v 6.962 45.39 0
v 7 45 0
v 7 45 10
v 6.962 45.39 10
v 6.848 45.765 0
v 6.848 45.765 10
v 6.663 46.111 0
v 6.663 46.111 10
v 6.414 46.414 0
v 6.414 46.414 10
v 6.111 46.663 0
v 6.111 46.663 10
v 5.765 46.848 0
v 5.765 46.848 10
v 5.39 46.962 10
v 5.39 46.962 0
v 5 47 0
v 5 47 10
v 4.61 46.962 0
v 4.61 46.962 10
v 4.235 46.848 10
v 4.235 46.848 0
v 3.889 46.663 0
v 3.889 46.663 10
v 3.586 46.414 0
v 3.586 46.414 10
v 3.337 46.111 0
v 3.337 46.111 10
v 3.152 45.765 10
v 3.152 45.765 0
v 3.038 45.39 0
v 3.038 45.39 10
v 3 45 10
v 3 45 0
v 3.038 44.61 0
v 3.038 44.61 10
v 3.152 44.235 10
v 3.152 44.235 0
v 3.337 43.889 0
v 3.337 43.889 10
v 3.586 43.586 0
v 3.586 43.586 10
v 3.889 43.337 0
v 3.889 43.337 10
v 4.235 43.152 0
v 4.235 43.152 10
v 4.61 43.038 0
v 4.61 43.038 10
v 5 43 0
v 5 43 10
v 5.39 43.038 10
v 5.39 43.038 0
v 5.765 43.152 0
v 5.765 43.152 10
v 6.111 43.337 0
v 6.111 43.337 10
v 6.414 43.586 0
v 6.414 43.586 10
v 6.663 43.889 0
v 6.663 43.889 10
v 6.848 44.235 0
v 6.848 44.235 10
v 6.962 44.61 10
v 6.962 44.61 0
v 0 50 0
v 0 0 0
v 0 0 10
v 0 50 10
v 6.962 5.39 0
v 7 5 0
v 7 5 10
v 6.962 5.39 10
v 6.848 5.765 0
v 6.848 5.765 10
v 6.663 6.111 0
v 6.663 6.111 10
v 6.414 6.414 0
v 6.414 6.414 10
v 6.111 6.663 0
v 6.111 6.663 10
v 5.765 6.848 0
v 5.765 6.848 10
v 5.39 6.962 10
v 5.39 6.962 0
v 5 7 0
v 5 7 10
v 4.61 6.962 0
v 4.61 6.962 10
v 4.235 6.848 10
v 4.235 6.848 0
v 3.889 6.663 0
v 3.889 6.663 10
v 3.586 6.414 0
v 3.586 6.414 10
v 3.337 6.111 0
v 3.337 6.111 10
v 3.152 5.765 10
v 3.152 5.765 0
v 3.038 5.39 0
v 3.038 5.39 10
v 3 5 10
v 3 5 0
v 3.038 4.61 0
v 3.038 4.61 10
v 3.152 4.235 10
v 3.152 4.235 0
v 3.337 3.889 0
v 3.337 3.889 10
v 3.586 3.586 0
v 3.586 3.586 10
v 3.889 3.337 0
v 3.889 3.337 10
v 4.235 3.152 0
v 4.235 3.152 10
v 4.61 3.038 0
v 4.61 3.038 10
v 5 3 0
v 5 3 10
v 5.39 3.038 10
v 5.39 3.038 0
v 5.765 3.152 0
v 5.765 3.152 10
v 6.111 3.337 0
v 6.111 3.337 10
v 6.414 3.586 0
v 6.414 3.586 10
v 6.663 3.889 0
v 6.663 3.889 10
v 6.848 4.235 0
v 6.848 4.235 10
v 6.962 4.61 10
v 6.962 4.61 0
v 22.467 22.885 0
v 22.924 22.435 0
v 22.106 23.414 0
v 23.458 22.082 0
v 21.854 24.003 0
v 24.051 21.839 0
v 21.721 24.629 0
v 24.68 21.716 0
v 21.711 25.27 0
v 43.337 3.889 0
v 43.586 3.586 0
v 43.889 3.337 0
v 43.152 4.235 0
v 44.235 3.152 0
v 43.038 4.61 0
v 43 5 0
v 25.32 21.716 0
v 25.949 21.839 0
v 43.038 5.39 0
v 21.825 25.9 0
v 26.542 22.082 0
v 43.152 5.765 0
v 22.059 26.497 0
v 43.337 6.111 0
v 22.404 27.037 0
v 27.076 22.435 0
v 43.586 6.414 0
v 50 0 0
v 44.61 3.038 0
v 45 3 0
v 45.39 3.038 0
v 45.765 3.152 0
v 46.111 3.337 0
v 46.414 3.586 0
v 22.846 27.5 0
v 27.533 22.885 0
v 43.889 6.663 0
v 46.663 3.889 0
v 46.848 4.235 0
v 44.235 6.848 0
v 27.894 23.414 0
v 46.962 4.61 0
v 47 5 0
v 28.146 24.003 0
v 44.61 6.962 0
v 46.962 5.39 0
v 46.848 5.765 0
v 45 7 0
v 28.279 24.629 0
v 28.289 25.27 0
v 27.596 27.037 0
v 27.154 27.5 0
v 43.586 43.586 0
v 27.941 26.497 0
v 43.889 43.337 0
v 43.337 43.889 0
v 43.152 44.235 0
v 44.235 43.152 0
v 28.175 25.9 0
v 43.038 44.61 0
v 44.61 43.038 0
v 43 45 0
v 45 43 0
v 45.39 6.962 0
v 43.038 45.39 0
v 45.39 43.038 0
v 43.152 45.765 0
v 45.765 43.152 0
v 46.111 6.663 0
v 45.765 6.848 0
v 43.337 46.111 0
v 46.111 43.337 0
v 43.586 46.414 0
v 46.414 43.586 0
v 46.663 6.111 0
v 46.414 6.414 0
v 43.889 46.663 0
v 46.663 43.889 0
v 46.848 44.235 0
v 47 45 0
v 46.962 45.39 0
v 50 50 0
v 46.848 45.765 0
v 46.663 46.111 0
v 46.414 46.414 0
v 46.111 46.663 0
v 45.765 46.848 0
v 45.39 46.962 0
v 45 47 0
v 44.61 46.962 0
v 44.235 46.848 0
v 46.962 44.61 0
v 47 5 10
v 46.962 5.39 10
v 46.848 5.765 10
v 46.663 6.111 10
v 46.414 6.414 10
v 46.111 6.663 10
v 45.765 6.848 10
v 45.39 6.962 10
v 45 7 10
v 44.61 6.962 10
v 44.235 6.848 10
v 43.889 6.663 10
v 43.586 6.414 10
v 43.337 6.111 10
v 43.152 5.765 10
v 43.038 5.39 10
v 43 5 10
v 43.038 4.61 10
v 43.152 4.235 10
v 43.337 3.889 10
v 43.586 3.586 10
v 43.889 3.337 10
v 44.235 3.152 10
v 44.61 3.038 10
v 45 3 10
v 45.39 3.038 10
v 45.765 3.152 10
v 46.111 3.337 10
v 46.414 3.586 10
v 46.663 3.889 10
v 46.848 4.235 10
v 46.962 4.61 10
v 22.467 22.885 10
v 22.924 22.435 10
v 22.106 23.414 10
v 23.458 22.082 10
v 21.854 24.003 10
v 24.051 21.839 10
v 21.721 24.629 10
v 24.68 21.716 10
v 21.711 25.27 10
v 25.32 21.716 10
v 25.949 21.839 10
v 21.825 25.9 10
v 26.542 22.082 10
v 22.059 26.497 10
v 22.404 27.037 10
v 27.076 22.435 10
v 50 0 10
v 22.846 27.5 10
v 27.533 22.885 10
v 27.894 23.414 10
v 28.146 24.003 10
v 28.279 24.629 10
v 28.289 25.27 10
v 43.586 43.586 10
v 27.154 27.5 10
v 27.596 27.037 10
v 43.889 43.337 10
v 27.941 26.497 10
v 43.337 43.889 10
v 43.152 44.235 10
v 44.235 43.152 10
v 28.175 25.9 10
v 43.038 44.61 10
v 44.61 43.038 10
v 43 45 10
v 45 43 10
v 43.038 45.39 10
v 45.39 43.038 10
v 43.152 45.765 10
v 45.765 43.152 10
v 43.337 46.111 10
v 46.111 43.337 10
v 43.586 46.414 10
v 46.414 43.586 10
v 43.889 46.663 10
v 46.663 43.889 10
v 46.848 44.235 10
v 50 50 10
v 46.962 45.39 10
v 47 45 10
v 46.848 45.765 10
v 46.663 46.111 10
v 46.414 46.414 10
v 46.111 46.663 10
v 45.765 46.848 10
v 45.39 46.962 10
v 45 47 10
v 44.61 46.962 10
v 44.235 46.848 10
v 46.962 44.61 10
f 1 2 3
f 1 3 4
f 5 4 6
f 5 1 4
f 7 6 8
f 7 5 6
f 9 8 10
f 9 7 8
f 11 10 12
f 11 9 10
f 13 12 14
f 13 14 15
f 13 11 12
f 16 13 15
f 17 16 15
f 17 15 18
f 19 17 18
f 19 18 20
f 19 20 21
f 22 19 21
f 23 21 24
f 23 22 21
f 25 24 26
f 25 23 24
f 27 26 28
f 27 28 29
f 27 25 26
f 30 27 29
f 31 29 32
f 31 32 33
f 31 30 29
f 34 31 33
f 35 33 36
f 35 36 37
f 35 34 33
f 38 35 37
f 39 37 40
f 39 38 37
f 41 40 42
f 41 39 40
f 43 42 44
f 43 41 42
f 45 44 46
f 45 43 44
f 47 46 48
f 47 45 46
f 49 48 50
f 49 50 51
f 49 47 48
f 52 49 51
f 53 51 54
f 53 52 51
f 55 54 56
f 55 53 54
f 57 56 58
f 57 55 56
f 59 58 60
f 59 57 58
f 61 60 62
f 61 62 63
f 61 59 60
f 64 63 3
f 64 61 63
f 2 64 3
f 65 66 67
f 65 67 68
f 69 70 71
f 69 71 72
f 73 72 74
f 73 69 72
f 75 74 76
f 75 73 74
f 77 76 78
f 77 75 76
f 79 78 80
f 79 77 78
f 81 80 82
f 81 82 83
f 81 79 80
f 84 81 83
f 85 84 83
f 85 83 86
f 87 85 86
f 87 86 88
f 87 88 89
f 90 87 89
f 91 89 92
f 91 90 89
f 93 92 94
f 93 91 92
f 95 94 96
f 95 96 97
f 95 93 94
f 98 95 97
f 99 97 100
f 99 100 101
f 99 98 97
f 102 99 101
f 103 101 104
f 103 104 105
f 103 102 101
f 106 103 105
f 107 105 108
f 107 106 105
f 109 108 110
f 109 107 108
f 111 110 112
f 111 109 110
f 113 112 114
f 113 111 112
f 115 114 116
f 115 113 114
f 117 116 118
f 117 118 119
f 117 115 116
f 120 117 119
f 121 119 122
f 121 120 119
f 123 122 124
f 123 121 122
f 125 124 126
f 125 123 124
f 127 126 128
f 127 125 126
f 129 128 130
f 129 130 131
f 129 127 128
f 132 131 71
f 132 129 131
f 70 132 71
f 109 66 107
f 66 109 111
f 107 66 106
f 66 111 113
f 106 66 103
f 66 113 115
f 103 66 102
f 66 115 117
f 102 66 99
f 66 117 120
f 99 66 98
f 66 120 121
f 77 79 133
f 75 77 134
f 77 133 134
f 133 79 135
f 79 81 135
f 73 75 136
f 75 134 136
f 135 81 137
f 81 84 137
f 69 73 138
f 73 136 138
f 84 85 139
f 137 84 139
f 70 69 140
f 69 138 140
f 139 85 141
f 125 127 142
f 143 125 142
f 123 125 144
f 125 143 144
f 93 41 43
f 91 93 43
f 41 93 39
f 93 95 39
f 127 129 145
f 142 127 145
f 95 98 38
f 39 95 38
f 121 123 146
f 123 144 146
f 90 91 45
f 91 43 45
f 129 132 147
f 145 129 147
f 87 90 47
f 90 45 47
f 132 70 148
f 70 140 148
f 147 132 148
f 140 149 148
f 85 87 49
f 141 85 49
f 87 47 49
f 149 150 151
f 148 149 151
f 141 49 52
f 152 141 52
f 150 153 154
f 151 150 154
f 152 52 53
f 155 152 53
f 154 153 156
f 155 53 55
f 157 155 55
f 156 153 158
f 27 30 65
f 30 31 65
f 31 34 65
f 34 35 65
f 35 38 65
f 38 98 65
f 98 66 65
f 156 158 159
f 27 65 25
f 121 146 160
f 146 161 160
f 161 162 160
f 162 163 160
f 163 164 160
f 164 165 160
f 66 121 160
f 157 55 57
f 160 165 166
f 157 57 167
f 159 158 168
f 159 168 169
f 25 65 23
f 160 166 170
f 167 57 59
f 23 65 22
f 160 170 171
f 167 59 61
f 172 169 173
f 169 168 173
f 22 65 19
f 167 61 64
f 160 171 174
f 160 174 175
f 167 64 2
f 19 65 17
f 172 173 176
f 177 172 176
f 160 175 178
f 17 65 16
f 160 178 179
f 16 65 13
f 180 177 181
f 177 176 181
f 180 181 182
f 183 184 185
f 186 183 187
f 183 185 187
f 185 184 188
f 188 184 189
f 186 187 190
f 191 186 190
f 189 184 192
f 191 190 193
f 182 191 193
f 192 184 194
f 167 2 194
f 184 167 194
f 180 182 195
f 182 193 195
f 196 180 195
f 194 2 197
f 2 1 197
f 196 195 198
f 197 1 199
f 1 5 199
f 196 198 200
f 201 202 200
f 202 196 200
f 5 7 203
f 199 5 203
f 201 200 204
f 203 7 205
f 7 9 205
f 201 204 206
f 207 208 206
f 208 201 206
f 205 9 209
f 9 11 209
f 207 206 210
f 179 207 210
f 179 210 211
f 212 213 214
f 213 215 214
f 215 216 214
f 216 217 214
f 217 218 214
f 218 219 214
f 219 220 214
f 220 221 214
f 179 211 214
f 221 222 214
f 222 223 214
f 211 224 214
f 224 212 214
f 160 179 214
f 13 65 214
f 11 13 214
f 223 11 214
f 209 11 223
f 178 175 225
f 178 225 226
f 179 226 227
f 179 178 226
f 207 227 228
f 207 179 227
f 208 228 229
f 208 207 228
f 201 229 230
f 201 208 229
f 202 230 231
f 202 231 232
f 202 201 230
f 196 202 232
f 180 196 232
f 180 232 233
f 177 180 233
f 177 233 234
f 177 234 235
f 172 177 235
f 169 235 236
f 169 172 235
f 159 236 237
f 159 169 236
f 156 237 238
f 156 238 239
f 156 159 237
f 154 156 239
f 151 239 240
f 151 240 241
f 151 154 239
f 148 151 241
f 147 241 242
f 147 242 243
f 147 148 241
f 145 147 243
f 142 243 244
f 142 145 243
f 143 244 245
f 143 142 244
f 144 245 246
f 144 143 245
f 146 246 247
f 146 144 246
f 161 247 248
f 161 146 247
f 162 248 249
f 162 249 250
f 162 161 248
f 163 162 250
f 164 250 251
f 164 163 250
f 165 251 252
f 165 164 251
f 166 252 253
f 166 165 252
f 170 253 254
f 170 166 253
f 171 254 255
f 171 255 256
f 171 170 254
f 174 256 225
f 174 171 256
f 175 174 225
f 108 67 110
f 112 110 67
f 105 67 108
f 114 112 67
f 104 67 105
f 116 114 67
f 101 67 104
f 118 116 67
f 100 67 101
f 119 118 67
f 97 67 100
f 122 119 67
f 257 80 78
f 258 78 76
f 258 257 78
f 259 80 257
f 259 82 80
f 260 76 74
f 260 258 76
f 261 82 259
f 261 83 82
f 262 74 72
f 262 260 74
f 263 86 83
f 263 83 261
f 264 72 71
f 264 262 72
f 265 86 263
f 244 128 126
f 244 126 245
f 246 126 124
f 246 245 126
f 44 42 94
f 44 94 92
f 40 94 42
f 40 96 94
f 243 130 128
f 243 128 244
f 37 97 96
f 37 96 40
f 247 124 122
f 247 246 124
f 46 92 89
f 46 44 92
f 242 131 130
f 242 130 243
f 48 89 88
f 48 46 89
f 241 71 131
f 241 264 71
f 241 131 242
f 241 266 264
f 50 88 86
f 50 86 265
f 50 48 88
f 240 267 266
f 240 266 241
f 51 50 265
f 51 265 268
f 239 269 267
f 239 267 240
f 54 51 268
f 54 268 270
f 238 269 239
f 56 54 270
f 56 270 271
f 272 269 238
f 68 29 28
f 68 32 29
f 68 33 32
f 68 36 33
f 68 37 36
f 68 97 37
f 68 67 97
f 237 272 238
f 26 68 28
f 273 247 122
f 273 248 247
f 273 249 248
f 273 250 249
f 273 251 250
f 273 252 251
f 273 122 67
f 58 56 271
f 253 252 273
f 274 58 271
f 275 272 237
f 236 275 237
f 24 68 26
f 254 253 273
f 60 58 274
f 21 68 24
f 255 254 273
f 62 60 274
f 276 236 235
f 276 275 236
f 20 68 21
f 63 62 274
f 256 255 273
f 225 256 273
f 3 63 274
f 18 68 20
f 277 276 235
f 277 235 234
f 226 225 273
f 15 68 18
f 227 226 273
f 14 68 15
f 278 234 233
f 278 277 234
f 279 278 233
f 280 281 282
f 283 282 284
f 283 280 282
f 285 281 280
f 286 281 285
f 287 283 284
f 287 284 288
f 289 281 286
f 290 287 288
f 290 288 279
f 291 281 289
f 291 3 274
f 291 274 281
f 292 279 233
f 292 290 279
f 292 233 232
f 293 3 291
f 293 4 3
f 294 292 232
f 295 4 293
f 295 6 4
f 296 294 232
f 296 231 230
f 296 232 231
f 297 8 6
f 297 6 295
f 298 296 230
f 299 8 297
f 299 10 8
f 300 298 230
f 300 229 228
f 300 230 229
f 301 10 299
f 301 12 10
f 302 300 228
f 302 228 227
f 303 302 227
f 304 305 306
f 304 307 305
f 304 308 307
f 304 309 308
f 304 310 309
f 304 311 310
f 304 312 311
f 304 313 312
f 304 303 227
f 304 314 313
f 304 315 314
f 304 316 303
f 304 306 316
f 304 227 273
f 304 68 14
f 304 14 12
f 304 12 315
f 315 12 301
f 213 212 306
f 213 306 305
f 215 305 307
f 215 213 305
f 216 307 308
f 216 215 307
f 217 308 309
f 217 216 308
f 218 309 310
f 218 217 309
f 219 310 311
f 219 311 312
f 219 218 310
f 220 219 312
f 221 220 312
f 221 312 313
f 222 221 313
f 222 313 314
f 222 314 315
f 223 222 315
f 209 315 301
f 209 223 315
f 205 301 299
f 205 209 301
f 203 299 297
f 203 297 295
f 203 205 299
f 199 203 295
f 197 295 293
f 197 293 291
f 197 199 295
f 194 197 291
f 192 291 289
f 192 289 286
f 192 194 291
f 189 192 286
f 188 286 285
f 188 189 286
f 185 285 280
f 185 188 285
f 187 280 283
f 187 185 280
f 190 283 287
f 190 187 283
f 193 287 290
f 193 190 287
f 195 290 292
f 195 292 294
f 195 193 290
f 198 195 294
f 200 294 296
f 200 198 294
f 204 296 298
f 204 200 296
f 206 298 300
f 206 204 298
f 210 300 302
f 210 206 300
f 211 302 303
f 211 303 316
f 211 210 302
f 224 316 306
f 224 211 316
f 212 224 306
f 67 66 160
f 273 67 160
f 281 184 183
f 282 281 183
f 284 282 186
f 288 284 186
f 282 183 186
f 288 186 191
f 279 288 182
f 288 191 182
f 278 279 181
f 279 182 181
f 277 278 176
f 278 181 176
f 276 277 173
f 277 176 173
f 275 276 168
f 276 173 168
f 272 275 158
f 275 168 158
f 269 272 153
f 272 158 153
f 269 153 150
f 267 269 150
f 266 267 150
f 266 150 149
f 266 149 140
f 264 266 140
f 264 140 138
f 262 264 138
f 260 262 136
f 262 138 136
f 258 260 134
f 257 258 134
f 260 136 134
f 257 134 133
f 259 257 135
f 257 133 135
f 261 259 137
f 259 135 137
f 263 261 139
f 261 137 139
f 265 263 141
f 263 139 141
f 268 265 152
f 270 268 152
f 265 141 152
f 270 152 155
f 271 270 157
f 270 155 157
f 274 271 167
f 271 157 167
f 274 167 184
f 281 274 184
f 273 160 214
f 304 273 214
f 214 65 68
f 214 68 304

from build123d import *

# Parameters (mm, degrees)
IZIM1_W                     = 50
IZIM1_H                     = 50
IZIM1_R                     = 2
Y_KSEKLIK_EKSTR_ZYON1_DEPTH = 10


with BuildPart() as part:
    # Çizim1 → Yükseklik-Ekstrüzyon1 (new body)
    with BuildSketch(Plane.XY):
        with Locations((25, 25)):
            Rectangle(IZIM1_W, IZIM1_H)
        with Locations((5, 45)):
            Circle(IZIM1_R, mode=Mode.SUBTRACT)
        with Locations((45, 45)):
            Circle(IZIM1_R, mode=Mode.SUBTRACT)
        with Locations((45, 5)):
            Circle(IZIM1_R, mode=Mode.SUBTRACT)
        with Locations((5, 5)):
            Circle(IZIM1_R, mode=Mode.SUBTRACT)
        with BuildLine():
            Line((22.845934077, 27.5), (27.154065923, 27.5))
            ThreePointArc((27.154065923, 27.5), (25, 21.7), (22.845934077, 27.5))
        make_face(mode=Mode.SUBTRACT)
    extrude(amount=Y_KSEKLIK_EKSTR_ZYON1_DEPTH)


solid = part.part
